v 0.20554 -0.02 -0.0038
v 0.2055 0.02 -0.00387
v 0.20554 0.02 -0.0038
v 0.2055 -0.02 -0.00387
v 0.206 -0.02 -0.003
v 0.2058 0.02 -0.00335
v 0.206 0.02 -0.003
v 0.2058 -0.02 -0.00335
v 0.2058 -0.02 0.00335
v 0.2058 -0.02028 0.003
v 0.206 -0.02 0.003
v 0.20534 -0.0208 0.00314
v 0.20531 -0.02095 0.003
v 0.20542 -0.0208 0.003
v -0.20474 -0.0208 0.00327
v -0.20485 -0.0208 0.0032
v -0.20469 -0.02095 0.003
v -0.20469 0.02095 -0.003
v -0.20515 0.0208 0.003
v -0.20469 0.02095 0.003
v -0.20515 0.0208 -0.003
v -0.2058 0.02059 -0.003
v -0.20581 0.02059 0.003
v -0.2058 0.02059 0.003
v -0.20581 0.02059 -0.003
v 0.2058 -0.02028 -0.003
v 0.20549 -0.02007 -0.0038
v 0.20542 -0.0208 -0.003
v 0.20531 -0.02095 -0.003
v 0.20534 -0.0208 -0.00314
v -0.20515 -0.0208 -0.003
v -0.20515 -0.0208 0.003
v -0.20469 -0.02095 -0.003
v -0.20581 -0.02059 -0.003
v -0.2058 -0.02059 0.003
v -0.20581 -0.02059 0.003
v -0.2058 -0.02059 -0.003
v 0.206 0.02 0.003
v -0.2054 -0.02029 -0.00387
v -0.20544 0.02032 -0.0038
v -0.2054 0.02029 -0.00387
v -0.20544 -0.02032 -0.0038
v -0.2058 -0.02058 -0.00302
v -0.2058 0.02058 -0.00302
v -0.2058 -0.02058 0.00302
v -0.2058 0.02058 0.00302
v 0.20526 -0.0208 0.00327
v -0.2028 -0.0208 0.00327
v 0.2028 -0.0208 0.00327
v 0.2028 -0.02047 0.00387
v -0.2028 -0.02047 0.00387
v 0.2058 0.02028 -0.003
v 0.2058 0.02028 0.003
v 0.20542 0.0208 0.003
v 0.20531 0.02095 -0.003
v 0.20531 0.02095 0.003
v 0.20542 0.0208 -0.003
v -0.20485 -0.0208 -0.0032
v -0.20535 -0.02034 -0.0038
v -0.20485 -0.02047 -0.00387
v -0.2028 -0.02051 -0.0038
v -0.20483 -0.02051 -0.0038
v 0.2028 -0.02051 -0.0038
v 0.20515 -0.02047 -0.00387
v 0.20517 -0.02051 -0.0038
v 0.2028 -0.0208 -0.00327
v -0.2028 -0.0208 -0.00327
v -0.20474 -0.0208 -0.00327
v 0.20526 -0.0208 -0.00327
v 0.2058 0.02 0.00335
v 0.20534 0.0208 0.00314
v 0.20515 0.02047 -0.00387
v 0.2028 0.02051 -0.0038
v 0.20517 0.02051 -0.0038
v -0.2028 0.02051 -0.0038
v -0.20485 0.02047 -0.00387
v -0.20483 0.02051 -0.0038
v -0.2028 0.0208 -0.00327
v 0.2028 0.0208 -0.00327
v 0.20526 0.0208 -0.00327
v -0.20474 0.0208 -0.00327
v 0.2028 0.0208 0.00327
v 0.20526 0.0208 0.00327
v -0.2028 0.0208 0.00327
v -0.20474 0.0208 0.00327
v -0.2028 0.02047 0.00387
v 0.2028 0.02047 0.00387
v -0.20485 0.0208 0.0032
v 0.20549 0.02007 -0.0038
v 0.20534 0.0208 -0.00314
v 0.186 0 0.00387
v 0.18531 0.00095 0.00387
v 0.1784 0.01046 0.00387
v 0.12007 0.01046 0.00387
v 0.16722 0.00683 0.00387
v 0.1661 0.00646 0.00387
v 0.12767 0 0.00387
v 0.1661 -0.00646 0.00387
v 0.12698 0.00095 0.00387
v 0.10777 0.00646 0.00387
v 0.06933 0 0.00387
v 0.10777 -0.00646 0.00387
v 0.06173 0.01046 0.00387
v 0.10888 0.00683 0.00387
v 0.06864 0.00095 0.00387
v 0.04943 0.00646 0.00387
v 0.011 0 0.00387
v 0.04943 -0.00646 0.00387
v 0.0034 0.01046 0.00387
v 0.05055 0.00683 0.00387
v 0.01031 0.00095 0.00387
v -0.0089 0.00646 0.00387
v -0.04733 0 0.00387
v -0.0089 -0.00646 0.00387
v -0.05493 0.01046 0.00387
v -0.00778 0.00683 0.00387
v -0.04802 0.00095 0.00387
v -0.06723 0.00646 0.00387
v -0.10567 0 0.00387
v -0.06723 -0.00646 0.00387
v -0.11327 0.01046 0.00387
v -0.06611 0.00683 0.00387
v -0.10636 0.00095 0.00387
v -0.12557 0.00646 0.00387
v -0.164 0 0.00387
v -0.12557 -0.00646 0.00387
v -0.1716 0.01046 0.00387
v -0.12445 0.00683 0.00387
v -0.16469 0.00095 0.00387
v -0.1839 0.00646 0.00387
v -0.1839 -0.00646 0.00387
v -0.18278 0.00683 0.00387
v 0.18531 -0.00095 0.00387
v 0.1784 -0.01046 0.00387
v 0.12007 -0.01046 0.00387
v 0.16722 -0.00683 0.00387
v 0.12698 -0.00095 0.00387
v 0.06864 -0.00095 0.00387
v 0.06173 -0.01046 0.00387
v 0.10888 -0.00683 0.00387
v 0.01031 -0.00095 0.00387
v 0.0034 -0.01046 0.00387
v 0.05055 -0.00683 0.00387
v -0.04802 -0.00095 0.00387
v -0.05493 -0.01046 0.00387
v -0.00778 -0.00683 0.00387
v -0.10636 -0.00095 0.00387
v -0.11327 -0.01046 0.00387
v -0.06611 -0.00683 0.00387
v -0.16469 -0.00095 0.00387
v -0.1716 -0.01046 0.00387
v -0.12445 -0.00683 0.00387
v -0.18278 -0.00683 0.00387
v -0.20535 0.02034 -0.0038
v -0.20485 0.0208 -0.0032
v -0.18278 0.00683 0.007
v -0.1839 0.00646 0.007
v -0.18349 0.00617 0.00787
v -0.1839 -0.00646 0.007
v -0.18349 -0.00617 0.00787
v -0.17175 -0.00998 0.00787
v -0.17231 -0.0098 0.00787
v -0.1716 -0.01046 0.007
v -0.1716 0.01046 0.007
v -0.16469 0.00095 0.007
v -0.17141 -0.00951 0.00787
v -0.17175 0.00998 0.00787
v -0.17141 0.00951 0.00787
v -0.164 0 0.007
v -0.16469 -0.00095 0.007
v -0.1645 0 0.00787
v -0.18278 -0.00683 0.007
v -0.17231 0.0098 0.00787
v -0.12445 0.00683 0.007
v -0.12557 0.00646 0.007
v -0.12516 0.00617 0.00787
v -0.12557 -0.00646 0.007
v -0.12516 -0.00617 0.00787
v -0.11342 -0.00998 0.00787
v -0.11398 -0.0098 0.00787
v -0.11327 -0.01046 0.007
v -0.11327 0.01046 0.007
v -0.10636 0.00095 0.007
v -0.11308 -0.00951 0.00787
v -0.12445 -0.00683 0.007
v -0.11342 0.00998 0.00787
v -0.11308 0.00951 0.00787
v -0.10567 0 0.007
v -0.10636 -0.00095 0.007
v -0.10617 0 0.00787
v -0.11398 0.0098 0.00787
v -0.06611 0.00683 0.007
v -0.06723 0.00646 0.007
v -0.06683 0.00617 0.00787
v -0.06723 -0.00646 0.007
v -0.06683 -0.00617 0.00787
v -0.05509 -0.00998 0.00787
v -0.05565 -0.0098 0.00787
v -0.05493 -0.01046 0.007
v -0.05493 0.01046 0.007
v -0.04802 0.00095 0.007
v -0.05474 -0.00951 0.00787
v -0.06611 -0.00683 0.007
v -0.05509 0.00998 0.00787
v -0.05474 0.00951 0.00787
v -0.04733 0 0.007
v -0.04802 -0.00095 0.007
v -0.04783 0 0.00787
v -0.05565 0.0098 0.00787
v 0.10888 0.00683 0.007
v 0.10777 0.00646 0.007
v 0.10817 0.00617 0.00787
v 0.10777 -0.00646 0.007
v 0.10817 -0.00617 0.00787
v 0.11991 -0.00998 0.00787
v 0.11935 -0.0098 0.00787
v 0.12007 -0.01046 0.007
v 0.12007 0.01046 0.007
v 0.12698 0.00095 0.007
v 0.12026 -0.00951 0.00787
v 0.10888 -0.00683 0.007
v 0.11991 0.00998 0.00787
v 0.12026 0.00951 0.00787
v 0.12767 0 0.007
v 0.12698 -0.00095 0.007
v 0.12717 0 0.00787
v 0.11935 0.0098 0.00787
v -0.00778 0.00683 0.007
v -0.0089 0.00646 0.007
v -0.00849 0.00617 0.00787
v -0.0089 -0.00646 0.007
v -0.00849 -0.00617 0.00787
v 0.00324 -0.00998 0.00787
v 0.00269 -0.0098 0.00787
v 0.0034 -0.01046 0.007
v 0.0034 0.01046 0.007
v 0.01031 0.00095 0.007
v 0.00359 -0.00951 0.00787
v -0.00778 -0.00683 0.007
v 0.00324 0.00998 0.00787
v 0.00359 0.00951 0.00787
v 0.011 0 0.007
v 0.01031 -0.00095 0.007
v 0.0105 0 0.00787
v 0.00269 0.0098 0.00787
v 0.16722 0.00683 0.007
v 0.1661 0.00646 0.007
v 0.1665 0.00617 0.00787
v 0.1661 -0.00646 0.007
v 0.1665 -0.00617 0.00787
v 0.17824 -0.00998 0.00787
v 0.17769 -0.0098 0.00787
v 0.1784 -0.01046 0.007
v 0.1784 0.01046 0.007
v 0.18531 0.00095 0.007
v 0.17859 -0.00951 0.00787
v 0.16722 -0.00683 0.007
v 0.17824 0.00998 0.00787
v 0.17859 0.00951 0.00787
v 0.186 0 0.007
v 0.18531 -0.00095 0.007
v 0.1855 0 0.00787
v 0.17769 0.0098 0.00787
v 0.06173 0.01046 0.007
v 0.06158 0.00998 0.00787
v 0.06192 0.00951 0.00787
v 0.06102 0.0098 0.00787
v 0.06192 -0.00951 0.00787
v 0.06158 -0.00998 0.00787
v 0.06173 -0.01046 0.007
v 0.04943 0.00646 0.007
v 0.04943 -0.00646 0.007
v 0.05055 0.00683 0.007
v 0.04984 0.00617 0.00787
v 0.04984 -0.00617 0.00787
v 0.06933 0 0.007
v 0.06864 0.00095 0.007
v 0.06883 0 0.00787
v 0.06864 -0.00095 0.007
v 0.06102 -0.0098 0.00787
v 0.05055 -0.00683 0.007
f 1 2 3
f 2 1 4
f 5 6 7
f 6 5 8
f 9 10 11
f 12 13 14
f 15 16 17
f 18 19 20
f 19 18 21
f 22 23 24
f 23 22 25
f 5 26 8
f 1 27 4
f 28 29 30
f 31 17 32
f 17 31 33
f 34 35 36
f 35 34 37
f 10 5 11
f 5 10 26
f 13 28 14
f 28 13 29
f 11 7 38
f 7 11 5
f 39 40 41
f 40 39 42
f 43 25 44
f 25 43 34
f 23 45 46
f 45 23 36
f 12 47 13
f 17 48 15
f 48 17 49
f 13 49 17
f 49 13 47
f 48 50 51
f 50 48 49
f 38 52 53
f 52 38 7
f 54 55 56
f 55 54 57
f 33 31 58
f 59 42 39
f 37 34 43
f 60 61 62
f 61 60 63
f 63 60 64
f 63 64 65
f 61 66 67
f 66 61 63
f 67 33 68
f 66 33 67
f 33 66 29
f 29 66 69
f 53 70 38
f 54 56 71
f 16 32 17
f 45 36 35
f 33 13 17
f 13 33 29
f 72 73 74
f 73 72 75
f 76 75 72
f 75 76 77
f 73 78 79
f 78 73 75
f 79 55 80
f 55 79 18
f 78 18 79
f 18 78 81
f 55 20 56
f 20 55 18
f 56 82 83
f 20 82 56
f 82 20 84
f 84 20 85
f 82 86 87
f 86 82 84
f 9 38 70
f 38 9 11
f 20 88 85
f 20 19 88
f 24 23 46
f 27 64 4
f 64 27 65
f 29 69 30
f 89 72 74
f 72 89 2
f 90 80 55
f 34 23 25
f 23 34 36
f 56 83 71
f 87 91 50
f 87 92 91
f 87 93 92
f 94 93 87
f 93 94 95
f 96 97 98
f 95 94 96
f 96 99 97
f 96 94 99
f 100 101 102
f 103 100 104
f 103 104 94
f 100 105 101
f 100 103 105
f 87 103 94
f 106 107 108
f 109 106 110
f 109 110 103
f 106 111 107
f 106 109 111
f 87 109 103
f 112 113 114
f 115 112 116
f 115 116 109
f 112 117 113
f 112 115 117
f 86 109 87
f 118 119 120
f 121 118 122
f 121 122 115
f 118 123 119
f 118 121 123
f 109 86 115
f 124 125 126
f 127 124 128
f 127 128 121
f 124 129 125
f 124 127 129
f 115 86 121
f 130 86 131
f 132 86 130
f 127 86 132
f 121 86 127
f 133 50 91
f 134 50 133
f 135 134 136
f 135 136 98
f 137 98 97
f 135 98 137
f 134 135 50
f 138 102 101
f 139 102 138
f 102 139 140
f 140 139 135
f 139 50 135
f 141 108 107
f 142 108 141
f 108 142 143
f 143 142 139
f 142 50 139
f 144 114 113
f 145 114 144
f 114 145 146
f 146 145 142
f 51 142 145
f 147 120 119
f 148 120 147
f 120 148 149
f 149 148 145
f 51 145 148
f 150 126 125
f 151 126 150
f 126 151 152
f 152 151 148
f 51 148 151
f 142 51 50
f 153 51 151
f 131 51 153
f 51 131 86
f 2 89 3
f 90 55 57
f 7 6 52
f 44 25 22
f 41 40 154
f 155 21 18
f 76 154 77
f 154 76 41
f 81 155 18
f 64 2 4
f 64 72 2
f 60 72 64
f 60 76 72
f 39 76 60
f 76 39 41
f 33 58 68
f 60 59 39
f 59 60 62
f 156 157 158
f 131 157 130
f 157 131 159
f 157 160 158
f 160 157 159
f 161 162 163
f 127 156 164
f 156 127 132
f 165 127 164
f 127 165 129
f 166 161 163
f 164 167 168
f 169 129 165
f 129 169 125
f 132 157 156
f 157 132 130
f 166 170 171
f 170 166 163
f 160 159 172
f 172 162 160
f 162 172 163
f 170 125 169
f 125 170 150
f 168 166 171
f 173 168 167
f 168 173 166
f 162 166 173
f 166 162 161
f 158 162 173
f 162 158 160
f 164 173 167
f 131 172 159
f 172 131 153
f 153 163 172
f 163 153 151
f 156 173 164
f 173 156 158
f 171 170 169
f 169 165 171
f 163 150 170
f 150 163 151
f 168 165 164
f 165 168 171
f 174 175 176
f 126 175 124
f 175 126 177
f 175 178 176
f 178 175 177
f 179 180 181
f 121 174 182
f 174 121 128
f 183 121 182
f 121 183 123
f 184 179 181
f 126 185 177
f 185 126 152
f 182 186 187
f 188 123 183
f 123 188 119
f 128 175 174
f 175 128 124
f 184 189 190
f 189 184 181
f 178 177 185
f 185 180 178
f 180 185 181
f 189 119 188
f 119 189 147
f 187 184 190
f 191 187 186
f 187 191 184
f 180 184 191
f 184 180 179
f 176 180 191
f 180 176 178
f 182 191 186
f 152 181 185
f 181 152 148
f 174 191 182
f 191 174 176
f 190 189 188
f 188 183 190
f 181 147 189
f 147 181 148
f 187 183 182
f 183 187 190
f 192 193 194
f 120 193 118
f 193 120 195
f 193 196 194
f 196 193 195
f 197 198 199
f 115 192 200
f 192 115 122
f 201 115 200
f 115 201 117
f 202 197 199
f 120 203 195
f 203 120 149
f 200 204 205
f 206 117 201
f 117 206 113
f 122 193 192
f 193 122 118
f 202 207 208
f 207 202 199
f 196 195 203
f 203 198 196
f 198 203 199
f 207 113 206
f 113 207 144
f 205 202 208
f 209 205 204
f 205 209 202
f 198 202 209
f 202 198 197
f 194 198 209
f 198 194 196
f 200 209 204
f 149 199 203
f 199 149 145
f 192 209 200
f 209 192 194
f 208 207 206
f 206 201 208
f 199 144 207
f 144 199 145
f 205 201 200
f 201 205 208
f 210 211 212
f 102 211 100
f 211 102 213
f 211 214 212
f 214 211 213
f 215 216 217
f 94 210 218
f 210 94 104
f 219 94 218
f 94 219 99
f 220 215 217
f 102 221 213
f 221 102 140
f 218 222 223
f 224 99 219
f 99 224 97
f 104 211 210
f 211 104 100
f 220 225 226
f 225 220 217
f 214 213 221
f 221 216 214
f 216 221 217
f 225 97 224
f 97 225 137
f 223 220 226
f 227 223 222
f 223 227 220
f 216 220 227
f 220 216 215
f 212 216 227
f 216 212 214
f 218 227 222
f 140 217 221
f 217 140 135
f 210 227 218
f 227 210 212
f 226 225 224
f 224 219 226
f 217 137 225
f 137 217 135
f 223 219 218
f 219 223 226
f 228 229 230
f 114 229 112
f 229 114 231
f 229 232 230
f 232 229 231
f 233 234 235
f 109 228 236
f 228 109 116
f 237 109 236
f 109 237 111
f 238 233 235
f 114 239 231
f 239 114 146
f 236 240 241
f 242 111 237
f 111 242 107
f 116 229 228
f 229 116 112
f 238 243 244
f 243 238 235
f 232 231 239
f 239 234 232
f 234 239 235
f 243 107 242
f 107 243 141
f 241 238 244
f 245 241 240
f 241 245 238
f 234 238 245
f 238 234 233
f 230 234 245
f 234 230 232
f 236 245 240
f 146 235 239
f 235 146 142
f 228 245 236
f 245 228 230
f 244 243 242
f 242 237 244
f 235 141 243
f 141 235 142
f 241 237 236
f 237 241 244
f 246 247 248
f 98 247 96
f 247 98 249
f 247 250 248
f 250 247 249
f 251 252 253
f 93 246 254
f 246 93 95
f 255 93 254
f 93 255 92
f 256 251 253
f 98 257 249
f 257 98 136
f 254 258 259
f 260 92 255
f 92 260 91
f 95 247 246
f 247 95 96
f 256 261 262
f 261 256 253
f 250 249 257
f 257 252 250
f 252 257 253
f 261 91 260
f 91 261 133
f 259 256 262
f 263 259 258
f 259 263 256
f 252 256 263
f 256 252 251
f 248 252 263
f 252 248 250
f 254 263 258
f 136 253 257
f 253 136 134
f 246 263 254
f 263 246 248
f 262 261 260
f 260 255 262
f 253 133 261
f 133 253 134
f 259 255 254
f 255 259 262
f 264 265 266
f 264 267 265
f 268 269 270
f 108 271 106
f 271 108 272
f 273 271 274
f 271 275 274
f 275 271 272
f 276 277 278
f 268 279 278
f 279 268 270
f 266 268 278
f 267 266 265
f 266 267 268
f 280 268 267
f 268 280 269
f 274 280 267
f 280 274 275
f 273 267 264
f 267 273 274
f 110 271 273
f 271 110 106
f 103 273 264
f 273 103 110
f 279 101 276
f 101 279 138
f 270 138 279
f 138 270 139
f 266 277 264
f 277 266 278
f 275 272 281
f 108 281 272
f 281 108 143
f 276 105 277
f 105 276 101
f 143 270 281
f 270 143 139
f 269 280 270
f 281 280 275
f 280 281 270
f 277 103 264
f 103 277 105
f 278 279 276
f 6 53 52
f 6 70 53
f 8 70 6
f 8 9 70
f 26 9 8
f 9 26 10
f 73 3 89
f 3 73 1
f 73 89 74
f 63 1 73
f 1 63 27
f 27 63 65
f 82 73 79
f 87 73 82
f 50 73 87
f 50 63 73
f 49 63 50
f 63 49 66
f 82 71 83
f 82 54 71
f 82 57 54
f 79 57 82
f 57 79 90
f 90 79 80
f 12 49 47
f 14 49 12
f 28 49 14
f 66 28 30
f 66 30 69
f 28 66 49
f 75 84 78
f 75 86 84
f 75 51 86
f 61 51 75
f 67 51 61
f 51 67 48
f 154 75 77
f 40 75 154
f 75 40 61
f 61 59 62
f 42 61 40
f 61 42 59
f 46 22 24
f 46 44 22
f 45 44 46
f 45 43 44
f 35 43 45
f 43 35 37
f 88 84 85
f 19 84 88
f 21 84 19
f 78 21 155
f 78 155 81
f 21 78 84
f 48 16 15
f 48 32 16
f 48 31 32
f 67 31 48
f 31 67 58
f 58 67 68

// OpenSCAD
// Parameters
L = 0.41; //[0.205:0.82:0.001]
W = 0.04; //[0.02:0.08:0.001]
H_total = 0.01; //[0.005:0.02:0.0005]
plate_H = 0.006; //[0.003:0.012:0.0005]
stud_H = 0.004; //[0.002:0.008:0.0005]
stud_D = 0.02; //[0.01:0.04:0.001]
stud_count = 7; //[3:15:1]
end_margin = 0.03; //[0.015:0.06:0.001]
stud_centerline_offset_W = 0.0; //[-0.01:0.01:0.0005]
stud_top_rounding = 0.002; //[0.001:0.004:0.0005]
overlap = 0.0008; //[0.0005:0.002:0.0001]
edge_fillet_r = 0.001; //[0.0005:0.002:0.0001]
chamfer_len = 0.003; //[0.0015:0.006:0.0005]

// Base Plate
module base_plate() {
  color("Silver")
  translate([0, 0, 0])
    cube([L, W, plate_H], center=true);
}

// Stud Cylinder
module stud_cylinder(index) {
  translate([
    -L/2 + end_margin + index * ((L - 2*end_margin) / (stud_count-1)),
    stud_centerline_offset_W,
    plate_H/2 + (stud_H + overlap)/2 - overlap
  ])
  cylinder(h=stud_H + overlap, r=stud_D/2, center=true);
}

// Stud Rounding Sphere
module stud_rounding_sphere(index) {
  translate([
    -L/2 + end_margin + index * ((L - 2*end_margin) / (stud_count-1)),
    stud_centerline_offset_W,
    plate_H/2 + stud_H - stud_top_rounding
  ])
  sphere(r=stud_top_rounding, center=true);
}

// Stud Row
module stud_row() {
  union() {
    for (i = [0:stud_count-1]) {
      stud_cylinder(i);
      stud_rounding_sphere(i);
    }
  }
}

// Edge Fillets Kernel
module edge_fillets_kernel() {
  sphere(r=edge_fillet_r, center=true);
}

// End Chamfer Wedge
module end_chamfer_wedge(pos) {
  translate([
    pos * (L/2 - chamfer_len/2 + overlap),
    0,
    H_total/2 - plate_H/2
  ])
  cube([chamfer_len, W + 2*overlap, H_total + 2*overlap], center=true);
}

// Final Model
module final_model() {
  difference() {
    minkowski() {
      union() {
        base_plate();
        stud_row();
      }
      edge_fillets_kernel();
    }
    end_chamfer_wedge(1);
    end_chamfer_wedge(-1);
  }
}

// Render the final model
final_model();
